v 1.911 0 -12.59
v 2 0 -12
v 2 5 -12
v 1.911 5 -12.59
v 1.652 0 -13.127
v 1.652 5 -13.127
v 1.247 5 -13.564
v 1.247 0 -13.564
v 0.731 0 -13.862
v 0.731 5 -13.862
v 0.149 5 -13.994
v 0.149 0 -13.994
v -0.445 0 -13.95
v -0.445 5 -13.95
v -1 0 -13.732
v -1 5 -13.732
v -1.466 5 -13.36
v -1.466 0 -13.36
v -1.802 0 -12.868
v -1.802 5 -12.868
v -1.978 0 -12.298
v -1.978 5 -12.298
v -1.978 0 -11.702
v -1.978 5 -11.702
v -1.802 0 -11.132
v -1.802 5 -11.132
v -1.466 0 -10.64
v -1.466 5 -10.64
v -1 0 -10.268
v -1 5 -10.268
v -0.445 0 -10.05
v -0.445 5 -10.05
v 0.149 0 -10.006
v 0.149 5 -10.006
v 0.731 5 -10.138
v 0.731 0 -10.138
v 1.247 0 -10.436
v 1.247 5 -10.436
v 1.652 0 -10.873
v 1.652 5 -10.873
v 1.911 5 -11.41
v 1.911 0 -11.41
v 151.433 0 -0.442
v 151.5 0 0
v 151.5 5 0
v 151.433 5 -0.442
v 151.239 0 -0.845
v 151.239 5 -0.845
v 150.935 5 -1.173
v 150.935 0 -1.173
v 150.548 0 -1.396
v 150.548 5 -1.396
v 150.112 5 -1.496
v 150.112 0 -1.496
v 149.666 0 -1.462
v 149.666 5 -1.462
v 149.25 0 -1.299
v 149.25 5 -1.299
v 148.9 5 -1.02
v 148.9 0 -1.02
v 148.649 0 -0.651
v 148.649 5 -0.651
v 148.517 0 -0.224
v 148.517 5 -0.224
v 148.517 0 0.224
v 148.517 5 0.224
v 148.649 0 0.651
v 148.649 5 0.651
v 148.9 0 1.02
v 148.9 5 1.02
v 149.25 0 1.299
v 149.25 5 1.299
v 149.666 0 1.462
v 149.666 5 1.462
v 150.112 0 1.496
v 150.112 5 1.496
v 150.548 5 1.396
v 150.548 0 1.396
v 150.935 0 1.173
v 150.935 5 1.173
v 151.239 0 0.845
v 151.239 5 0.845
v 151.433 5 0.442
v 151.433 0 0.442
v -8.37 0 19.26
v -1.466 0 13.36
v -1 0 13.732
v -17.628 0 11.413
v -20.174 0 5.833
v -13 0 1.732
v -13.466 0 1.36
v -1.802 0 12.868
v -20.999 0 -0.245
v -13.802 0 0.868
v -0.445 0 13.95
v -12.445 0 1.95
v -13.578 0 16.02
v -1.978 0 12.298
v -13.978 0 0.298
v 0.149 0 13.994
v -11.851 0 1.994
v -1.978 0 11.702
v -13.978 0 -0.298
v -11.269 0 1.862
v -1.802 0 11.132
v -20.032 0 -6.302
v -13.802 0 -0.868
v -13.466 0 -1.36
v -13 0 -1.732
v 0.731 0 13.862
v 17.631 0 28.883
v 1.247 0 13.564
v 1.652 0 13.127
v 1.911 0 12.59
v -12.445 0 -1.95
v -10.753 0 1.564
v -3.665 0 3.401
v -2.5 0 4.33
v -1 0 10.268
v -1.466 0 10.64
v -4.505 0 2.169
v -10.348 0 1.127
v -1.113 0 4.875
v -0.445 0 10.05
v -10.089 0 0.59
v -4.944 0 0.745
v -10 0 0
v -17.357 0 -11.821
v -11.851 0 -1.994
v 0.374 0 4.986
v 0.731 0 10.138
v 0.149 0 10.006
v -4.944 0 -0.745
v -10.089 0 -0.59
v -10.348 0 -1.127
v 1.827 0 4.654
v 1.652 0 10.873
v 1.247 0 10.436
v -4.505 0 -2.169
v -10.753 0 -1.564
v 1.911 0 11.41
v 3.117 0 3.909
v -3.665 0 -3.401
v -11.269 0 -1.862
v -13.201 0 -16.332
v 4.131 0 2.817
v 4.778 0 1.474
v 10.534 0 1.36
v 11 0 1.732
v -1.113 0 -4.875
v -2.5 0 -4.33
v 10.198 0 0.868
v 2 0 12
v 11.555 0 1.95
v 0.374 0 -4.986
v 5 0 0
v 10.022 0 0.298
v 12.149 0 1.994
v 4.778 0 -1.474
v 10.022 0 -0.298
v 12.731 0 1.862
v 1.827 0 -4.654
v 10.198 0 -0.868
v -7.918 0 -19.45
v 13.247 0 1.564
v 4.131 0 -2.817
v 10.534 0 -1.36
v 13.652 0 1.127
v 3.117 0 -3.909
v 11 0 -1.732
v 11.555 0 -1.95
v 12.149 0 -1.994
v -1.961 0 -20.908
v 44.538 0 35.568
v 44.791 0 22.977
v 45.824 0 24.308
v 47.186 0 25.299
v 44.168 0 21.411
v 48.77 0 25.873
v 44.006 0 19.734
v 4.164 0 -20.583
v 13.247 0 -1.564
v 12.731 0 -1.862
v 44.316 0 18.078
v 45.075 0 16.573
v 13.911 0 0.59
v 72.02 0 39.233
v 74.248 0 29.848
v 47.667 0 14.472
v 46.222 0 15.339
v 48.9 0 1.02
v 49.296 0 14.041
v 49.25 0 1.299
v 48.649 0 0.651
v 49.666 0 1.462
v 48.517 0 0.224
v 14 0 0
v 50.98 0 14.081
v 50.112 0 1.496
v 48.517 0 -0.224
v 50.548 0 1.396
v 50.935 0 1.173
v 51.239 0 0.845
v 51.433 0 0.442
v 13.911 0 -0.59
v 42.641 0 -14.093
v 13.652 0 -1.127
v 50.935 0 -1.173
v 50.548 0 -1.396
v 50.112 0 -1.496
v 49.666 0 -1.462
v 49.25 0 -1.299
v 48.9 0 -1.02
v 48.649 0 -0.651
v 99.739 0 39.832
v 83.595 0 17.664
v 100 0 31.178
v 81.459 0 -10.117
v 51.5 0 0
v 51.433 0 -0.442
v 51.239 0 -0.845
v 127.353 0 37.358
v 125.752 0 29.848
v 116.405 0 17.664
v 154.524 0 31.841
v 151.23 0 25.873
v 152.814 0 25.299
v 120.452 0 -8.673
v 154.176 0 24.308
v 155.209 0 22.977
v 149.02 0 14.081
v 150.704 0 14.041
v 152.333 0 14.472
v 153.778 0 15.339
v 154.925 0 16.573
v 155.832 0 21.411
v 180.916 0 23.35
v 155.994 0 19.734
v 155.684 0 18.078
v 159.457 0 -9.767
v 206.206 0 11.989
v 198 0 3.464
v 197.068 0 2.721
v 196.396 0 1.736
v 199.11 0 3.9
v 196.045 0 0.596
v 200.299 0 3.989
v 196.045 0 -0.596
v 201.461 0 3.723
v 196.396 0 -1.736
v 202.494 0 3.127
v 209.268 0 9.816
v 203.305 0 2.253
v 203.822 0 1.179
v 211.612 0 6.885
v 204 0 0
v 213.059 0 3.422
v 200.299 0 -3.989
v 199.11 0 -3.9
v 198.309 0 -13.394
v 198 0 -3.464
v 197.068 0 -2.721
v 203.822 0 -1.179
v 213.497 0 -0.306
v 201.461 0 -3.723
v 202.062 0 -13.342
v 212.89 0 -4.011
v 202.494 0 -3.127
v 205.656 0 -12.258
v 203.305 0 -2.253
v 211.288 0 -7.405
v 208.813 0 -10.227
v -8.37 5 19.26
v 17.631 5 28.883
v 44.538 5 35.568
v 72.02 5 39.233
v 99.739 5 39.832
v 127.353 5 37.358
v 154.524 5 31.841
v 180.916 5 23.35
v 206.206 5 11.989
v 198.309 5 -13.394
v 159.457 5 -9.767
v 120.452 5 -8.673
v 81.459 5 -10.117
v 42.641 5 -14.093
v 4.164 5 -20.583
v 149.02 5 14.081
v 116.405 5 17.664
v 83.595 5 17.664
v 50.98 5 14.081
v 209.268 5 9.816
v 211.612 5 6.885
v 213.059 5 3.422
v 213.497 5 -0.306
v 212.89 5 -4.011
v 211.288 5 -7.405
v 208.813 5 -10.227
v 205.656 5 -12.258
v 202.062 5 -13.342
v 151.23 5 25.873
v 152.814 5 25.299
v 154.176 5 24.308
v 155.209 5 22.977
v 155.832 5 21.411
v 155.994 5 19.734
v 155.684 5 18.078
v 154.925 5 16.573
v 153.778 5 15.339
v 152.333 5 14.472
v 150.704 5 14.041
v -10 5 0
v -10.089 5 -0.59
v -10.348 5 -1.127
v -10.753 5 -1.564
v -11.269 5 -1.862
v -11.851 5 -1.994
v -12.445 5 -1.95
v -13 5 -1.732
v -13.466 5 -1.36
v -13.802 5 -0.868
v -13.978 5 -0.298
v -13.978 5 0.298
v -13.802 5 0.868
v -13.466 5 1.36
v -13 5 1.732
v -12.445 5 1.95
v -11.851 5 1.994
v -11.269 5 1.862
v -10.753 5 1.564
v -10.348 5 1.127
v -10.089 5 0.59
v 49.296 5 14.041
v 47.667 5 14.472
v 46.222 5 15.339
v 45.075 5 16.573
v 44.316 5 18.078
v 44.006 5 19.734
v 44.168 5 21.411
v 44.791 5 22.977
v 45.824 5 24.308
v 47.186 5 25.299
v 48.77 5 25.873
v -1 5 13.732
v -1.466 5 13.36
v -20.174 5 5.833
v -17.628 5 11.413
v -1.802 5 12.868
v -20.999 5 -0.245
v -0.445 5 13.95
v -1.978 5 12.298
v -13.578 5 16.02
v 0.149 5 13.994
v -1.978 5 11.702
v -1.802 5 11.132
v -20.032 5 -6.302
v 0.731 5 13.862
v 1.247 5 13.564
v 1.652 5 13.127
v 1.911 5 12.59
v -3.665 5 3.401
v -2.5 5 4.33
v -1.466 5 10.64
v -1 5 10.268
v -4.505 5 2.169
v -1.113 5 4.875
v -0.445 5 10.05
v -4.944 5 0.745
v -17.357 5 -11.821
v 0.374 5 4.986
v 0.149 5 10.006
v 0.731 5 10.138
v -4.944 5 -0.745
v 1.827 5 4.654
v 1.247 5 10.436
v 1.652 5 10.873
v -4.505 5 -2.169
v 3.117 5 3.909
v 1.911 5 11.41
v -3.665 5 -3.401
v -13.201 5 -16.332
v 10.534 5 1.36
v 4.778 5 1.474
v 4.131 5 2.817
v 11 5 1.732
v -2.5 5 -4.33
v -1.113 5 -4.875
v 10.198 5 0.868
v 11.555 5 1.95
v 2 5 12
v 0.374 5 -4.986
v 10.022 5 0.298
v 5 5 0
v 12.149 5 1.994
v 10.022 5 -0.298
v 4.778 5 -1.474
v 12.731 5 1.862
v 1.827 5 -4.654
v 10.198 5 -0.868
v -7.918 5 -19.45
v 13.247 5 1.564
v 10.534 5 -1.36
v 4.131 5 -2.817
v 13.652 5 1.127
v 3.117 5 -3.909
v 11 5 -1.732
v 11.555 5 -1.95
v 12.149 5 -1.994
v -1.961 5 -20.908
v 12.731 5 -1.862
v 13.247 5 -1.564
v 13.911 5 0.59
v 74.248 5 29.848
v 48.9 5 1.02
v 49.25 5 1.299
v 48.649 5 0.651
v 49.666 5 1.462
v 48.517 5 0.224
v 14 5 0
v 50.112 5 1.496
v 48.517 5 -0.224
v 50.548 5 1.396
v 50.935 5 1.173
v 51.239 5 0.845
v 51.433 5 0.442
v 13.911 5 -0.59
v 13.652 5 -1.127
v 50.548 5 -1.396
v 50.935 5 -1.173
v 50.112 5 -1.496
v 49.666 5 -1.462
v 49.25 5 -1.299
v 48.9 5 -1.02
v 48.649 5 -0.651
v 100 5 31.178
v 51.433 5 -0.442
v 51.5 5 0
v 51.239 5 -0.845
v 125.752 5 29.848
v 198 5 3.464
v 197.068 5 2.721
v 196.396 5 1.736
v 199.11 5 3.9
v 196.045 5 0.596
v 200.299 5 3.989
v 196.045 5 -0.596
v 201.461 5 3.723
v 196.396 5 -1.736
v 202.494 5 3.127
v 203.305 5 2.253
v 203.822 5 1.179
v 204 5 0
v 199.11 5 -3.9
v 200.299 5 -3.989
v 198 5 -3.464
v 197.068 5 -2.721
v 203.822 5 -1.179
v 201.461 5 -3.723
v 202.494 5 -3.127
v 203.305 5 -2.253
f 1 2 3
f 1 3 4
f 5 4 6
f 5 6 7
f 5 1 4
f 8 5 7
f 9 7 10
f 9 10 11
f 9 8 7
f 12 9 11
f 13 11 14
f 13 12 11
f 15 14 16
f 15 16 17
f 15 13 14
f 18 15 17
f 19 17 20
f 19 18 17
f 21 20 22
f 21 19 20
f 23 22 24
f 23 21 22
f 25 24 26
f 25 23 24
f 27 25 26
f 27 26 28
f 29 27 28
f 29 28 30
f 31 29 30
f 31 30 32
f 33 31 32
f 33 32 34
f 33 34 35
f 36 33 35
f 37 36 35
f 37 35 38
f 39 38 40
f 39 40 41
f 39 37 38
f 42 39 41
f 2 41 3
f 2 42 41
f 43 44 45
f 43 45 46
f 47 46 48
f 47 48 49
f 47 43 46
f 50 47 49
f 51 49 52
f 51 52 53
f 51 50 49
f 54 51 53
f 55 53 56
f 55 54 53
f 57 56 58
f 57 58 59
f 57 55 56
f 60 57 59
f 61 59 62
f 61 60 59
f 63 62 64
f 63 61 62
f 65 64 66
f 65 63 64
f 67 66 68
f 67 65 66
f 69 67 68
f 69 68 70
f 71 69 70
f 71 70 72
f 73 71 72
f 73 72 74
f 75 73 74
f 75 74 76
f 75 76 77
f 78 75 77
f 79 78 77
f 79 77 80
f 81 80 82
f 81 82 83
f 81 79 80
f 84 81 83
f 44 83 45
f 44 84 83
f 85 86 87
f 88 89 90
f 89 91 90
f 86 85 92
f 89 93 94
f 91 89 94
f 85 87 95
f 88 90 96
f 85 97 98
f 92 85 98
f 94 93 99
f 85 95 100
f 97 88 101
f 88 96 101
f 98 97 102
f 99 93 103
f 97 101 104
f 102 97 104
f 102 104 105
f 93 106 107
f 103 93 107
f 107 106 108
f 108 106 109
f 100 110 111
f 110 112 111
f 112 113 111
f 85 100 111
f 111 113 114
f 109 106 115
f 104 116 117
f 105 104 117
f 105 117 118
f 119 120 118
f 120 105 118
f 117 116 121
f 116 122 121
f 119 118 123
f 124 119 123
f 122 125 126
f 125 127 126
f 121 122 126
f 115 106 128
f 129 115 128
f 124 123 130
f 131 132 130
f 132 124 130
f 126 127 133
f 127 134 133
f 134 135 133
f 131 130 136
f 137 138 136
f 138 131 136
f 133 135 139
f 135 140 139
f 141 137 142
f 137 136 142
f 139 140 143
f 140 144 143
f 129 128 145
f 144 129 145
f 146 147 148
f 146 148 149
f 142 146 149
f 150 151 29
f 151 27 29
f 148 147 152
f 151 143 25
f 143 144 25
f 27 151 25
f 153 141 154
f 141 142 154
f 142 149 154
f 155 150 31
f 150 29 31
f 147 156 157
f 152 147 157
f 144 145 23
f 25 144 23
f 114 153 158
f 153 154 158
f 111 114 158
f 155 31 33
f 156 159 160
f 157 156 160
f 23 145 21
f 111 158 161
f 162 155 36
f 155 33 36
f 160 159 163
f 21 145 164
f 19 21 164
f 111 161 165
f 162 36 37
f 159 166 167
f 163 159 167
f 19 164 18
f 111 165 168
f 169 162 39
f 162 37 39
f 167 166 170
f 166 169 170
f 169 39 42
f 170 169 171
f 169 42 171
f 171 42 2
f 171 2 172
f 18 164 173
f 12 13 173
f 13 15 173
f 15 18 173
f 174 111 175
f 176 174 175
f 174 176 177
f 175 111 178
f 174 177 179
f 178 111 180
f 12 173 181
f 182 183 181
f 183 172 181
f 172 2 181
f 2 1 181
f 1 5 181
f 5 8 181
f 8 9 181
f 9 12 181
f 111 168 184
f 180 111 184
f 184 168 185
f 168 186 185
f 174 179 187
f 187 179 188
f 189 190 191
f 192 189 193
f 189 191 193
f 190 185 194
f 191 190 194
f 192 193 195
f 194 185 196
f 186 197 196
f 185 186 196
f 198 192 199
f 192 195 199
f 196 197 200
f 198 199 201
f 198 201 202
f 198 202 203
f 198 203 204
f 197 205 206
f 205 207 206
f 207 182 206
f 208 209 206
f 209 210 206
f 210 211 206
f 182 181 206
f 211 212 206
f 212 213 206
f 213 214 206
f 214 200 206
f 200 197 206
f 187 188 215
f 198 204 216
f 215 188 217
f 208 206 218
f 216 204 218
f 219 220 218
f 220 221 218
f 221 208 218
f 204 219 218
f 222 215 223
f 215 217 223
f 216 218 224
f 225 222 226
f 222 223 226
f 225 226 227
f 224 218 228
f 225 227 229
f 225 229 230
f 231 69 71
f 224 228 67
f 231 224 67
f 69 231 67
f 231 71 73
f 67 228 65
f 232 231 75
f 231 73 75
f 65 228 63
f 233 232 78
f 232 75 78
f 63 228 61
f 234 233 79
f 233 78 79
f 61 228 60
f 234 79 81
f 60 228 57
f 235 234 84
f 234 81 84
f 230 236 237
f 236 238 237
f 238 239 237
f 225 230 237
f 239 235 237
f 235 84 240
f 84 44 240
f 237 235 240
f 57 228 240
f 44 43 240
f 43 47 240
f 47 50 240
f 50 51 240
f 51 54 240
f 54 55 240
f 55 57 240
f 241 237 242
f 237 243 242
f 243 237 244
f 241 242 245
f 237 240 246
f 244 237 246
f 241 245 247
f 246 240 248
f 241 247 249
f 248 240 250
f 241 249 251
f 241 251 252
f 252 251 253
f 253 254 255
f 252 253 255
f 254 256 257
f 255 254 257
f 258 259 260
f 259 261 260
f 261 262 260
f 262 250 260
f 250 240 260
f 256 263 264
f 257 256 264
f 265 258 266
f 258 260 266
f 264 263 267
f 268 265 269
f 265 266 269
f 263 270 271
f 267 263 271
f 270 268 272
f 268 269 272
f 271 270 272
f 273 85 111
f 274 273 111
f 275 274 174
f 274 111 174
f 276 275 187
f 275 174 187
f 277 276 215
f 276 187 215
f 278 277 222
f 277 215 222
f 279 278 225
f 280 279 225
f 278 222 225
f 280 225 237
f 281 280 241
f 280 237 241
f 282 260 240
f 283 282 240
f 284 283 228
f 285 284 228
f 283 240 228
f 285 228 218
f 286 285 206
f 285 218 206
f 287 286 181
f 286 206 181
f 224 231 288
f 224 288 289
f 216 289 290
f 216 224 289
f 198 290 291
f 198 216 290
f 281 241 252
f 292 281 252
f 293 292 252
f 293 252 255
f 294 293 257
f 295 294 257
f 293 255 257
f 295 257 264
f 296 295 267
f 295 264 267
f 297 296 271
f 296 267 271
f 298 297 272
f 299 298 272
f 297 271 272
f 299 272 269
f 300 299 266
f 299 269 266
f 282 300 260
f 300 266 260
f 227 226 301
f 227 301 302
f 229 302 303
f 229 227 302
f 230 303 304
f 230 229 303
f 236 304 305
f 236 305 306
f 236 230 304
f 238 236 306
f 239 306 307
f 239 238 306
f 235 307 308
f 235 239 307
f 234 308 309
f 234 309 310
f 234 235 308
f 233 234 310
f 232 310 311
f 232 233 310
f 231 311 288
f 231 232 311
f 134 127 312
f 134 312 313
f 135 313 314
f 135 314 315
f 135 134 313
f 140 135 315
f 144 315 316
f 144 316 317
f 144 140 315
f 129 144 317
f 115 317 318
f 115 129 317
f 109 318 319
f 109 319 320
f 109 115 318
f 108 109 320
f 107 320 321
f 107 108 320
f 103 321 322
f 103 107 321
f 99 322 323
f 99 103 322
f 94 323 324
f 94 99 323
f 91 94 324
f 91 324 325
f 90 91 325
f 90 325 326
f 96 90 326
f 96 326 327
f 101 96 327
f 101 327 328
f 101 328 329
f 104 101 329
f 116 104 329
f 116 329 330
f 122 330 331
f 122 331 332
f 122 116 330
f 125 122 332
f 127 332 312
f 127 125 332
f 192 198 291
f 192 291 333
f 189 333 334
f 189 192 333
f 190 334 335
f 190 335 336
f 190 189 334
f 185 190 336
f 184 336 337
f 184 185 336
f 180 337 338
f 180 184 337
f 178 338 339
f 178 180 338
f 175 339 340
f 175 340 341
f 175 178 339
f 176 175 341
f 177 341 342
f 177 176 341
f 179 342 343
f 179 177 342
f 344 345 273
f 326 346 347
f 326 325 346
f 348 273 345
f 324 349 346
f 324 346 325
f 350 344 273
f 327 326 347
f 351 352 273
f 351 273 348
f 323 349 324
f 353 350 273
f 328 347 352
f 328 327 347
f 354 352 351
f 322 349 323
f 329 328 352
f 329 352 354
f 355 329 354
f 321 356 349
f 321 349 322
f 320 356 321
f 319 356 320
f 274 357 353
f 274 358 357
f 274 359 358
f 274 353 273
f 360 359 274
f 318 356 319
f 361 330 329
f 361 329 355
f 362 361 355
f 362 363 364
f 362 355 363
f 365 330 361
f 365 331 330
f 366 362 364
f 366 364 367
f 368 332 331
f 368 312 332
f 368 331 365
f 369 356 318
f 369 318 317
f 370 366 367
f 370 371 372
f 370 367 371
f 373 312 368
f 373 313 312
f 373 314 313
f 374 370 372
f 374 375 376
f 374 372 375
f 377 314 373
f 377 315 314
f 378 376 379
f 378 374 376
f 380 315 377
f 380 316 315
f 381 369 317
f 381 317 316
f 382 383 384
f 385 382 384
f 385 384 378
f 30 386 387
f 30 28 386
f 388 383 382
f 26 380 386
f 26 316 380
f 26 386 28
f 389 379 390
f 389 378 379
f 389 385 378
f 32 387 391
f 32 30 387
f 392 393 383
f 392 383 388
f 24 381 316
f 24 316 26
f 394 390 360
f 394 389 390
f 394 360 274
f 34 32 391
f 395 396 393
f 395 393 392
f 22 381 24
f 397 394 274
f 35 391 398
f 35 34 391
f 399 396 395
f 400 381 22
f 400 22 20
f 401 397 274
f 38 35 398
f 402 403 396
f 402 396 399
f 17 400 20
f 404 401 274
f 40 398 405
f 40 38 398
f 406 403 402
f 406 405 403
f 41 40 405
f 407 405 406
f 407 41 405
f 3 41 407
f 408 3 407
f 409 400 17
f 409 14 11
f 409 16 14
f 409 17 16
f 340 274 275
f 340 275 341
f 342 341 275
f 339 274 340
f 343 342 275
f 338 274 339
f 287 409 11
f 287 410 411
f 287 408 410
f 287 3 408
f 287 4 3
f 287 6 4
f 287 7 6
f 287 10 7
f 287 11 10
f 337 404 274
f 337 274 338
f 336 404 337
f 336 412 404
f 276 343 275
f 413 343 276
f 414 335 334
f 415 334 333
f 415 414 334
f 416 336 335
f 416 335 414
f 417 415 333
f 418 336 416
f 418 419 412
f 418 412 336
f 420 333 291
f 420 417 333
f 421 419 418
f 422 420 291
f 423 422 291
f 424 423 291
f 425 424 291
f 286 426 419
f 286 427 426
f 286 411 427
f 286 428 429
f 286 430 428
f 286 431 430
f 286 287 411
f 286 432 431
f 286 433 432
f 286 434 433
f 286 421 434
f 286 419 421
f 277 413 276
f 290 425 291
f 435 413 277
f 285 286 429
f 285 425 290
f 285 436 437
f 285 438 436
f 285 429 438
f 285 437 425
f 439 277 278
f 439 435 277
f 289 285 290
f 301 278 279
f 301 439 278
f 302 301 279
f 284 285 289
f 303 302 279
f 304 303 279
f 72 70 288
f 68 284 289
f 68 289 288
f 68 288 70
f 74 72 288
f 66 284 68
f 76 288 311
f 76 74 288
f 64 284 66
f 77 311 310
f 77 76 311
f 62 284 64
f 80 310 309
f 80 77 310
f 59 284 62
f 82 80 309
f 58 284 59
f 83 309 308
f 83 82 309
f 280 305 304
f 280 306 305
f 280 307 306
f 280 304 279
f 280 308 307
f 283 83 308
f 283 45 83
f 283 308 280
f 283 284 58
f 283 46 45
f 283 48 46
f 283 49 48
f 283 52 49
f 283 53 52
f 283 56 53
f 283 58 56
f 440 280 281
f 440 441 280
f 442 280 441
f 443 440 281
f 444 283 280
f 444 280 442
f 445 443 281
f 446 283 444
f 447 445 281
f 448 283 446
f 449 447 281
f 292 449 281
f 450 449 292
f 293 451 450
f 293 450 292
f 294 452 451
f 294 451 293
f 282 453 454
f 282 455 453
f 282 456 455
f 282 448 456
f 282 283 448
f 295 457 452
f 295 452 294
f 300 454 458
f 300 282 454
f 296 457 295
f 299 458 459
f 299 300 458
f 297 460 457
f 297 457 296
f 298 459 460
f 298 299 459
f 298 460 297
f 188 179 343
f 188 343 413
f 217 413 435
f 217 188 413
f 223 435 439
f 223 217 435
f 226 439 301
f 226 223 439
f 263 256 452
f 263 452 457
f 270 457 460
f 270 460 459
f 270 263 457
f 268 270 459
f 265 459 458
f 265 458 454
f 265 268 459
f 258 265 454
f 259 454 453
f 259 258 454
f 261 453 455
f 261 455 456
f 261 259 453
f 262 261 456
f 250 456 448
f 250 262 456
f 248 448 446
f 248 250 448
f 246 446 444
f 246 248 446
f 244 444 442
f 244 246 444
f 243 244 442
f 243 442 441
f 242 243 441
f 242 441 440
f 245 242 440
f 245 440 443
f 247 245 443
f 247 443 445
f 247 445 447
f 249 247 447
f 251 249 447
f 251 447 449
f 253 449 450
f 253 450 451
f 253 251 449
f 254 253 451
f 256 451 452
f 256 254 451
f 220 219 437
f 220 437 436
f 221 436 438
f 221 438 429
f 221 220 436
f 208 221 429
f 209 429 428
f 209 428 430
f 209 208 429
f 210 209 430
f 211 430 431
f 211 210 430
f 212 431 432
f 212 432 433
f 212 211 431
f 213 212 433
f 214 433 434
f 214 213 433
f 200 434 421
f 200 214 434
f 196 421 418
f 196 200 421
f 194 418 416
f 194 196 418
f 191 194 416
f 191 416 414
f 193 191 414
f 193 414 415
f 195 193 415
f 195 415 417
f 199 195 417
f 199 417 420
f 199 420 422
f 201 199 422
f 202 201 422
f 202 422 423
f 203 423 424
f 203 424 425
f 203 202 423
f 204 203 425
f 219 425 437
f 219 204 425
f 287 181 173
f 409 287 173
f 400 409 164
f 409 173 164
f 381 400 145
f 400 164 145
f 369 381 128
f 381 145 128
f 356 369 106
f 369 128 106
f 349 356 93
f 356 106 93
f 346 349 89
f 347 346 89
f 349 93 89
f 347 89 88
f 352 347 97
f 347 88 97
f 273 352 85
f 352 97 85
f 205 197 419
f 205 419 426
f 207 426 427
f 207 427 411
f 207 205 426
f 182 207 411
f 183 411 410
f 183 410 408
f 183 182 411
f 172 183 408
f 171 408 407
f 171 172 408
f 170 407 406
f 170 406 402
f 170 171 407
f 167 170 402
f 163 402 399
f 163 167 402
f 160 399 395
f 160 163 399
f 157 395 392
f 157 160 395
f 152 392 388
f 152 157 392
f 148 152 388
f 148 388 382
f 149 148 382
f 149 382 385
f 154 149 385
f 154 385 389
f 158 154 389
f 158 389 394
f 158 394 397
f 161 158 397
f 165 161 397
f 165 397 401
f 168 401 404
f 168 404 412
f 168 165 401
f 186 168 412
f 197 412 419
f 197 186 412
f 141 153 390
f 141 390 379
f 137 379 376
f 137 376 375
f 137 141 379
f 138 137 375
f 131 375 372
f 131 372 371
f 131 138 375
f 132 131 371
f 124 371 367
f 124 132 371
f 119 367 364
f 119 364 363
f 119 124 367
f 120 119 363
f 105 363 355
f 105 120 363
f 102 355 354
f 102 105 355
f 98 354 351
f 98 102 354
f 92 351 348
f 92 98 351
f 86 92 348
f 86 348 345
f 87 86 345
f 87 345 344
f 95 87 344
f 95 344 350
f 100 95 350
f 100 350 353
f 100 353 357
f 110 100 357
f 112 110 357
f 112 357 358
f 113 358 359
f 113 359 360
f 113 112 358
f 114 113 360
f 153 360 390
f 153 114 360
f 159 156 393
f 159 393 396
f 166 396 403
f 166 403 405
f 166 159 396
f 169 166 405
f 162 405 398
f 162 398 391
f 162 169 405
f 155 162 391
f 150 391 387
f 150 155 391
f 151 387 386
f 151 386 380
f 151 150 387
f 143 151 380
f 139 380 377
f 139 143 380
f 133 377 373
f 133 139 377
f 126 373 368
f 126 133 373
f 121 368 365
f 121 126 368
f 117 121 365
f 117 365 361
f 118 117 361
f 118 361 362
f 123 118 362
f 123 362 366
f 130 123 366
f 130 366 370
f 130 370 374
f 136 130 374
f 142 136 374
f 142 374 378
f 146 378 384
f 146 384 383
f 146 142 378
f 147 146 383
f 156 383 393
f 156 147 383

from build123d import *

# Parameters (mm, degrees)
SKETCH1_R           = 5
SKETCH1_R_2         = 2
SKETCH1_R_3         = 4
SKETCH1_R_4         = 1.5
BOSS_EXTRUDE1_DEPTH = 5


with BuildPart() as part:
    # Sketch1 → Boss-Extrude1 (new body)
    with BuildSketch(Plane(origin=(0, 0, 0), x_dir=(1, 0, 0), z_dir=(0, 1, 0))):
        with BuildLine():
            ThreePointArc((4.164387077, 20.582951204), (-20.032105437, 6.301964119), (-8.369909934, -19.259922318))
            ThreePointArc((-8.369909934, -19.259922318), (99.738576714, -39.831721611), (206.206468023, -11.98873449))
            ThreePointArc((206.206468023, -11.98873449), (212.890441324, 4.010800728), (198.30885544, 13.393656337))
            ThreePointArc((198.30885544, 13.393656337), (100.943706101, 9.078229318), (4.164387077, 20.582951204))
        make_face()
        Circle(SKETCH1_R, mode=Mode.SUBTRACT)
        with Locations((0, 12)):
            Circle(SKETCH1_R_2, mode=Mode.SUBTRACT)
        with Locations((12, 0)):
            Circle(SKETCH1_R_2, mode=Mode.SUBTRACT)
        with Locations((0, -12)):
            Circle(SKETCH1_R_2, mode=Mode.SUBTRACT)
        with Locations((-12, 0)):
            Circle(SKETCH1_R_2, mode=Mode.SUBTRACT)
        with Locations((200, 0)):
            Circle(SKETCH1_R_3, mode=Mode.SUBTRACT)
        with Locations((50, 0)):
            Circle(SKETCH1_R_4, mode=Mode.SUBTRACT)
        with Locations((150, 0)):
            Circle(SKETCH1_R_4, mode=Mode.SUBTRACT)
        with BuildLine():
            ThreePointArc((151.229508397, -25.872674783), (155.897333295, -18.894803181), (149.019607843, -14.08063929))
            ThreePointArc((149.019607843, -14.08063929), (100, -18.112603774), (50.980392157, -14.08063929))
            ThreePointArc((50.980392157, -14.08063929), (44.102666705, -18.894803181), (48.770491603, -25.872674783))
            ThreePointArc((48.770491603, -25.872674783), (100, -31.177890471), (151.229508397, -25.872674783))
        make_face(mode=Mode.SUBTRACT)
    extrude(amount=BOSS_EXTRUDE1_DEPTH)


solid = part.part
